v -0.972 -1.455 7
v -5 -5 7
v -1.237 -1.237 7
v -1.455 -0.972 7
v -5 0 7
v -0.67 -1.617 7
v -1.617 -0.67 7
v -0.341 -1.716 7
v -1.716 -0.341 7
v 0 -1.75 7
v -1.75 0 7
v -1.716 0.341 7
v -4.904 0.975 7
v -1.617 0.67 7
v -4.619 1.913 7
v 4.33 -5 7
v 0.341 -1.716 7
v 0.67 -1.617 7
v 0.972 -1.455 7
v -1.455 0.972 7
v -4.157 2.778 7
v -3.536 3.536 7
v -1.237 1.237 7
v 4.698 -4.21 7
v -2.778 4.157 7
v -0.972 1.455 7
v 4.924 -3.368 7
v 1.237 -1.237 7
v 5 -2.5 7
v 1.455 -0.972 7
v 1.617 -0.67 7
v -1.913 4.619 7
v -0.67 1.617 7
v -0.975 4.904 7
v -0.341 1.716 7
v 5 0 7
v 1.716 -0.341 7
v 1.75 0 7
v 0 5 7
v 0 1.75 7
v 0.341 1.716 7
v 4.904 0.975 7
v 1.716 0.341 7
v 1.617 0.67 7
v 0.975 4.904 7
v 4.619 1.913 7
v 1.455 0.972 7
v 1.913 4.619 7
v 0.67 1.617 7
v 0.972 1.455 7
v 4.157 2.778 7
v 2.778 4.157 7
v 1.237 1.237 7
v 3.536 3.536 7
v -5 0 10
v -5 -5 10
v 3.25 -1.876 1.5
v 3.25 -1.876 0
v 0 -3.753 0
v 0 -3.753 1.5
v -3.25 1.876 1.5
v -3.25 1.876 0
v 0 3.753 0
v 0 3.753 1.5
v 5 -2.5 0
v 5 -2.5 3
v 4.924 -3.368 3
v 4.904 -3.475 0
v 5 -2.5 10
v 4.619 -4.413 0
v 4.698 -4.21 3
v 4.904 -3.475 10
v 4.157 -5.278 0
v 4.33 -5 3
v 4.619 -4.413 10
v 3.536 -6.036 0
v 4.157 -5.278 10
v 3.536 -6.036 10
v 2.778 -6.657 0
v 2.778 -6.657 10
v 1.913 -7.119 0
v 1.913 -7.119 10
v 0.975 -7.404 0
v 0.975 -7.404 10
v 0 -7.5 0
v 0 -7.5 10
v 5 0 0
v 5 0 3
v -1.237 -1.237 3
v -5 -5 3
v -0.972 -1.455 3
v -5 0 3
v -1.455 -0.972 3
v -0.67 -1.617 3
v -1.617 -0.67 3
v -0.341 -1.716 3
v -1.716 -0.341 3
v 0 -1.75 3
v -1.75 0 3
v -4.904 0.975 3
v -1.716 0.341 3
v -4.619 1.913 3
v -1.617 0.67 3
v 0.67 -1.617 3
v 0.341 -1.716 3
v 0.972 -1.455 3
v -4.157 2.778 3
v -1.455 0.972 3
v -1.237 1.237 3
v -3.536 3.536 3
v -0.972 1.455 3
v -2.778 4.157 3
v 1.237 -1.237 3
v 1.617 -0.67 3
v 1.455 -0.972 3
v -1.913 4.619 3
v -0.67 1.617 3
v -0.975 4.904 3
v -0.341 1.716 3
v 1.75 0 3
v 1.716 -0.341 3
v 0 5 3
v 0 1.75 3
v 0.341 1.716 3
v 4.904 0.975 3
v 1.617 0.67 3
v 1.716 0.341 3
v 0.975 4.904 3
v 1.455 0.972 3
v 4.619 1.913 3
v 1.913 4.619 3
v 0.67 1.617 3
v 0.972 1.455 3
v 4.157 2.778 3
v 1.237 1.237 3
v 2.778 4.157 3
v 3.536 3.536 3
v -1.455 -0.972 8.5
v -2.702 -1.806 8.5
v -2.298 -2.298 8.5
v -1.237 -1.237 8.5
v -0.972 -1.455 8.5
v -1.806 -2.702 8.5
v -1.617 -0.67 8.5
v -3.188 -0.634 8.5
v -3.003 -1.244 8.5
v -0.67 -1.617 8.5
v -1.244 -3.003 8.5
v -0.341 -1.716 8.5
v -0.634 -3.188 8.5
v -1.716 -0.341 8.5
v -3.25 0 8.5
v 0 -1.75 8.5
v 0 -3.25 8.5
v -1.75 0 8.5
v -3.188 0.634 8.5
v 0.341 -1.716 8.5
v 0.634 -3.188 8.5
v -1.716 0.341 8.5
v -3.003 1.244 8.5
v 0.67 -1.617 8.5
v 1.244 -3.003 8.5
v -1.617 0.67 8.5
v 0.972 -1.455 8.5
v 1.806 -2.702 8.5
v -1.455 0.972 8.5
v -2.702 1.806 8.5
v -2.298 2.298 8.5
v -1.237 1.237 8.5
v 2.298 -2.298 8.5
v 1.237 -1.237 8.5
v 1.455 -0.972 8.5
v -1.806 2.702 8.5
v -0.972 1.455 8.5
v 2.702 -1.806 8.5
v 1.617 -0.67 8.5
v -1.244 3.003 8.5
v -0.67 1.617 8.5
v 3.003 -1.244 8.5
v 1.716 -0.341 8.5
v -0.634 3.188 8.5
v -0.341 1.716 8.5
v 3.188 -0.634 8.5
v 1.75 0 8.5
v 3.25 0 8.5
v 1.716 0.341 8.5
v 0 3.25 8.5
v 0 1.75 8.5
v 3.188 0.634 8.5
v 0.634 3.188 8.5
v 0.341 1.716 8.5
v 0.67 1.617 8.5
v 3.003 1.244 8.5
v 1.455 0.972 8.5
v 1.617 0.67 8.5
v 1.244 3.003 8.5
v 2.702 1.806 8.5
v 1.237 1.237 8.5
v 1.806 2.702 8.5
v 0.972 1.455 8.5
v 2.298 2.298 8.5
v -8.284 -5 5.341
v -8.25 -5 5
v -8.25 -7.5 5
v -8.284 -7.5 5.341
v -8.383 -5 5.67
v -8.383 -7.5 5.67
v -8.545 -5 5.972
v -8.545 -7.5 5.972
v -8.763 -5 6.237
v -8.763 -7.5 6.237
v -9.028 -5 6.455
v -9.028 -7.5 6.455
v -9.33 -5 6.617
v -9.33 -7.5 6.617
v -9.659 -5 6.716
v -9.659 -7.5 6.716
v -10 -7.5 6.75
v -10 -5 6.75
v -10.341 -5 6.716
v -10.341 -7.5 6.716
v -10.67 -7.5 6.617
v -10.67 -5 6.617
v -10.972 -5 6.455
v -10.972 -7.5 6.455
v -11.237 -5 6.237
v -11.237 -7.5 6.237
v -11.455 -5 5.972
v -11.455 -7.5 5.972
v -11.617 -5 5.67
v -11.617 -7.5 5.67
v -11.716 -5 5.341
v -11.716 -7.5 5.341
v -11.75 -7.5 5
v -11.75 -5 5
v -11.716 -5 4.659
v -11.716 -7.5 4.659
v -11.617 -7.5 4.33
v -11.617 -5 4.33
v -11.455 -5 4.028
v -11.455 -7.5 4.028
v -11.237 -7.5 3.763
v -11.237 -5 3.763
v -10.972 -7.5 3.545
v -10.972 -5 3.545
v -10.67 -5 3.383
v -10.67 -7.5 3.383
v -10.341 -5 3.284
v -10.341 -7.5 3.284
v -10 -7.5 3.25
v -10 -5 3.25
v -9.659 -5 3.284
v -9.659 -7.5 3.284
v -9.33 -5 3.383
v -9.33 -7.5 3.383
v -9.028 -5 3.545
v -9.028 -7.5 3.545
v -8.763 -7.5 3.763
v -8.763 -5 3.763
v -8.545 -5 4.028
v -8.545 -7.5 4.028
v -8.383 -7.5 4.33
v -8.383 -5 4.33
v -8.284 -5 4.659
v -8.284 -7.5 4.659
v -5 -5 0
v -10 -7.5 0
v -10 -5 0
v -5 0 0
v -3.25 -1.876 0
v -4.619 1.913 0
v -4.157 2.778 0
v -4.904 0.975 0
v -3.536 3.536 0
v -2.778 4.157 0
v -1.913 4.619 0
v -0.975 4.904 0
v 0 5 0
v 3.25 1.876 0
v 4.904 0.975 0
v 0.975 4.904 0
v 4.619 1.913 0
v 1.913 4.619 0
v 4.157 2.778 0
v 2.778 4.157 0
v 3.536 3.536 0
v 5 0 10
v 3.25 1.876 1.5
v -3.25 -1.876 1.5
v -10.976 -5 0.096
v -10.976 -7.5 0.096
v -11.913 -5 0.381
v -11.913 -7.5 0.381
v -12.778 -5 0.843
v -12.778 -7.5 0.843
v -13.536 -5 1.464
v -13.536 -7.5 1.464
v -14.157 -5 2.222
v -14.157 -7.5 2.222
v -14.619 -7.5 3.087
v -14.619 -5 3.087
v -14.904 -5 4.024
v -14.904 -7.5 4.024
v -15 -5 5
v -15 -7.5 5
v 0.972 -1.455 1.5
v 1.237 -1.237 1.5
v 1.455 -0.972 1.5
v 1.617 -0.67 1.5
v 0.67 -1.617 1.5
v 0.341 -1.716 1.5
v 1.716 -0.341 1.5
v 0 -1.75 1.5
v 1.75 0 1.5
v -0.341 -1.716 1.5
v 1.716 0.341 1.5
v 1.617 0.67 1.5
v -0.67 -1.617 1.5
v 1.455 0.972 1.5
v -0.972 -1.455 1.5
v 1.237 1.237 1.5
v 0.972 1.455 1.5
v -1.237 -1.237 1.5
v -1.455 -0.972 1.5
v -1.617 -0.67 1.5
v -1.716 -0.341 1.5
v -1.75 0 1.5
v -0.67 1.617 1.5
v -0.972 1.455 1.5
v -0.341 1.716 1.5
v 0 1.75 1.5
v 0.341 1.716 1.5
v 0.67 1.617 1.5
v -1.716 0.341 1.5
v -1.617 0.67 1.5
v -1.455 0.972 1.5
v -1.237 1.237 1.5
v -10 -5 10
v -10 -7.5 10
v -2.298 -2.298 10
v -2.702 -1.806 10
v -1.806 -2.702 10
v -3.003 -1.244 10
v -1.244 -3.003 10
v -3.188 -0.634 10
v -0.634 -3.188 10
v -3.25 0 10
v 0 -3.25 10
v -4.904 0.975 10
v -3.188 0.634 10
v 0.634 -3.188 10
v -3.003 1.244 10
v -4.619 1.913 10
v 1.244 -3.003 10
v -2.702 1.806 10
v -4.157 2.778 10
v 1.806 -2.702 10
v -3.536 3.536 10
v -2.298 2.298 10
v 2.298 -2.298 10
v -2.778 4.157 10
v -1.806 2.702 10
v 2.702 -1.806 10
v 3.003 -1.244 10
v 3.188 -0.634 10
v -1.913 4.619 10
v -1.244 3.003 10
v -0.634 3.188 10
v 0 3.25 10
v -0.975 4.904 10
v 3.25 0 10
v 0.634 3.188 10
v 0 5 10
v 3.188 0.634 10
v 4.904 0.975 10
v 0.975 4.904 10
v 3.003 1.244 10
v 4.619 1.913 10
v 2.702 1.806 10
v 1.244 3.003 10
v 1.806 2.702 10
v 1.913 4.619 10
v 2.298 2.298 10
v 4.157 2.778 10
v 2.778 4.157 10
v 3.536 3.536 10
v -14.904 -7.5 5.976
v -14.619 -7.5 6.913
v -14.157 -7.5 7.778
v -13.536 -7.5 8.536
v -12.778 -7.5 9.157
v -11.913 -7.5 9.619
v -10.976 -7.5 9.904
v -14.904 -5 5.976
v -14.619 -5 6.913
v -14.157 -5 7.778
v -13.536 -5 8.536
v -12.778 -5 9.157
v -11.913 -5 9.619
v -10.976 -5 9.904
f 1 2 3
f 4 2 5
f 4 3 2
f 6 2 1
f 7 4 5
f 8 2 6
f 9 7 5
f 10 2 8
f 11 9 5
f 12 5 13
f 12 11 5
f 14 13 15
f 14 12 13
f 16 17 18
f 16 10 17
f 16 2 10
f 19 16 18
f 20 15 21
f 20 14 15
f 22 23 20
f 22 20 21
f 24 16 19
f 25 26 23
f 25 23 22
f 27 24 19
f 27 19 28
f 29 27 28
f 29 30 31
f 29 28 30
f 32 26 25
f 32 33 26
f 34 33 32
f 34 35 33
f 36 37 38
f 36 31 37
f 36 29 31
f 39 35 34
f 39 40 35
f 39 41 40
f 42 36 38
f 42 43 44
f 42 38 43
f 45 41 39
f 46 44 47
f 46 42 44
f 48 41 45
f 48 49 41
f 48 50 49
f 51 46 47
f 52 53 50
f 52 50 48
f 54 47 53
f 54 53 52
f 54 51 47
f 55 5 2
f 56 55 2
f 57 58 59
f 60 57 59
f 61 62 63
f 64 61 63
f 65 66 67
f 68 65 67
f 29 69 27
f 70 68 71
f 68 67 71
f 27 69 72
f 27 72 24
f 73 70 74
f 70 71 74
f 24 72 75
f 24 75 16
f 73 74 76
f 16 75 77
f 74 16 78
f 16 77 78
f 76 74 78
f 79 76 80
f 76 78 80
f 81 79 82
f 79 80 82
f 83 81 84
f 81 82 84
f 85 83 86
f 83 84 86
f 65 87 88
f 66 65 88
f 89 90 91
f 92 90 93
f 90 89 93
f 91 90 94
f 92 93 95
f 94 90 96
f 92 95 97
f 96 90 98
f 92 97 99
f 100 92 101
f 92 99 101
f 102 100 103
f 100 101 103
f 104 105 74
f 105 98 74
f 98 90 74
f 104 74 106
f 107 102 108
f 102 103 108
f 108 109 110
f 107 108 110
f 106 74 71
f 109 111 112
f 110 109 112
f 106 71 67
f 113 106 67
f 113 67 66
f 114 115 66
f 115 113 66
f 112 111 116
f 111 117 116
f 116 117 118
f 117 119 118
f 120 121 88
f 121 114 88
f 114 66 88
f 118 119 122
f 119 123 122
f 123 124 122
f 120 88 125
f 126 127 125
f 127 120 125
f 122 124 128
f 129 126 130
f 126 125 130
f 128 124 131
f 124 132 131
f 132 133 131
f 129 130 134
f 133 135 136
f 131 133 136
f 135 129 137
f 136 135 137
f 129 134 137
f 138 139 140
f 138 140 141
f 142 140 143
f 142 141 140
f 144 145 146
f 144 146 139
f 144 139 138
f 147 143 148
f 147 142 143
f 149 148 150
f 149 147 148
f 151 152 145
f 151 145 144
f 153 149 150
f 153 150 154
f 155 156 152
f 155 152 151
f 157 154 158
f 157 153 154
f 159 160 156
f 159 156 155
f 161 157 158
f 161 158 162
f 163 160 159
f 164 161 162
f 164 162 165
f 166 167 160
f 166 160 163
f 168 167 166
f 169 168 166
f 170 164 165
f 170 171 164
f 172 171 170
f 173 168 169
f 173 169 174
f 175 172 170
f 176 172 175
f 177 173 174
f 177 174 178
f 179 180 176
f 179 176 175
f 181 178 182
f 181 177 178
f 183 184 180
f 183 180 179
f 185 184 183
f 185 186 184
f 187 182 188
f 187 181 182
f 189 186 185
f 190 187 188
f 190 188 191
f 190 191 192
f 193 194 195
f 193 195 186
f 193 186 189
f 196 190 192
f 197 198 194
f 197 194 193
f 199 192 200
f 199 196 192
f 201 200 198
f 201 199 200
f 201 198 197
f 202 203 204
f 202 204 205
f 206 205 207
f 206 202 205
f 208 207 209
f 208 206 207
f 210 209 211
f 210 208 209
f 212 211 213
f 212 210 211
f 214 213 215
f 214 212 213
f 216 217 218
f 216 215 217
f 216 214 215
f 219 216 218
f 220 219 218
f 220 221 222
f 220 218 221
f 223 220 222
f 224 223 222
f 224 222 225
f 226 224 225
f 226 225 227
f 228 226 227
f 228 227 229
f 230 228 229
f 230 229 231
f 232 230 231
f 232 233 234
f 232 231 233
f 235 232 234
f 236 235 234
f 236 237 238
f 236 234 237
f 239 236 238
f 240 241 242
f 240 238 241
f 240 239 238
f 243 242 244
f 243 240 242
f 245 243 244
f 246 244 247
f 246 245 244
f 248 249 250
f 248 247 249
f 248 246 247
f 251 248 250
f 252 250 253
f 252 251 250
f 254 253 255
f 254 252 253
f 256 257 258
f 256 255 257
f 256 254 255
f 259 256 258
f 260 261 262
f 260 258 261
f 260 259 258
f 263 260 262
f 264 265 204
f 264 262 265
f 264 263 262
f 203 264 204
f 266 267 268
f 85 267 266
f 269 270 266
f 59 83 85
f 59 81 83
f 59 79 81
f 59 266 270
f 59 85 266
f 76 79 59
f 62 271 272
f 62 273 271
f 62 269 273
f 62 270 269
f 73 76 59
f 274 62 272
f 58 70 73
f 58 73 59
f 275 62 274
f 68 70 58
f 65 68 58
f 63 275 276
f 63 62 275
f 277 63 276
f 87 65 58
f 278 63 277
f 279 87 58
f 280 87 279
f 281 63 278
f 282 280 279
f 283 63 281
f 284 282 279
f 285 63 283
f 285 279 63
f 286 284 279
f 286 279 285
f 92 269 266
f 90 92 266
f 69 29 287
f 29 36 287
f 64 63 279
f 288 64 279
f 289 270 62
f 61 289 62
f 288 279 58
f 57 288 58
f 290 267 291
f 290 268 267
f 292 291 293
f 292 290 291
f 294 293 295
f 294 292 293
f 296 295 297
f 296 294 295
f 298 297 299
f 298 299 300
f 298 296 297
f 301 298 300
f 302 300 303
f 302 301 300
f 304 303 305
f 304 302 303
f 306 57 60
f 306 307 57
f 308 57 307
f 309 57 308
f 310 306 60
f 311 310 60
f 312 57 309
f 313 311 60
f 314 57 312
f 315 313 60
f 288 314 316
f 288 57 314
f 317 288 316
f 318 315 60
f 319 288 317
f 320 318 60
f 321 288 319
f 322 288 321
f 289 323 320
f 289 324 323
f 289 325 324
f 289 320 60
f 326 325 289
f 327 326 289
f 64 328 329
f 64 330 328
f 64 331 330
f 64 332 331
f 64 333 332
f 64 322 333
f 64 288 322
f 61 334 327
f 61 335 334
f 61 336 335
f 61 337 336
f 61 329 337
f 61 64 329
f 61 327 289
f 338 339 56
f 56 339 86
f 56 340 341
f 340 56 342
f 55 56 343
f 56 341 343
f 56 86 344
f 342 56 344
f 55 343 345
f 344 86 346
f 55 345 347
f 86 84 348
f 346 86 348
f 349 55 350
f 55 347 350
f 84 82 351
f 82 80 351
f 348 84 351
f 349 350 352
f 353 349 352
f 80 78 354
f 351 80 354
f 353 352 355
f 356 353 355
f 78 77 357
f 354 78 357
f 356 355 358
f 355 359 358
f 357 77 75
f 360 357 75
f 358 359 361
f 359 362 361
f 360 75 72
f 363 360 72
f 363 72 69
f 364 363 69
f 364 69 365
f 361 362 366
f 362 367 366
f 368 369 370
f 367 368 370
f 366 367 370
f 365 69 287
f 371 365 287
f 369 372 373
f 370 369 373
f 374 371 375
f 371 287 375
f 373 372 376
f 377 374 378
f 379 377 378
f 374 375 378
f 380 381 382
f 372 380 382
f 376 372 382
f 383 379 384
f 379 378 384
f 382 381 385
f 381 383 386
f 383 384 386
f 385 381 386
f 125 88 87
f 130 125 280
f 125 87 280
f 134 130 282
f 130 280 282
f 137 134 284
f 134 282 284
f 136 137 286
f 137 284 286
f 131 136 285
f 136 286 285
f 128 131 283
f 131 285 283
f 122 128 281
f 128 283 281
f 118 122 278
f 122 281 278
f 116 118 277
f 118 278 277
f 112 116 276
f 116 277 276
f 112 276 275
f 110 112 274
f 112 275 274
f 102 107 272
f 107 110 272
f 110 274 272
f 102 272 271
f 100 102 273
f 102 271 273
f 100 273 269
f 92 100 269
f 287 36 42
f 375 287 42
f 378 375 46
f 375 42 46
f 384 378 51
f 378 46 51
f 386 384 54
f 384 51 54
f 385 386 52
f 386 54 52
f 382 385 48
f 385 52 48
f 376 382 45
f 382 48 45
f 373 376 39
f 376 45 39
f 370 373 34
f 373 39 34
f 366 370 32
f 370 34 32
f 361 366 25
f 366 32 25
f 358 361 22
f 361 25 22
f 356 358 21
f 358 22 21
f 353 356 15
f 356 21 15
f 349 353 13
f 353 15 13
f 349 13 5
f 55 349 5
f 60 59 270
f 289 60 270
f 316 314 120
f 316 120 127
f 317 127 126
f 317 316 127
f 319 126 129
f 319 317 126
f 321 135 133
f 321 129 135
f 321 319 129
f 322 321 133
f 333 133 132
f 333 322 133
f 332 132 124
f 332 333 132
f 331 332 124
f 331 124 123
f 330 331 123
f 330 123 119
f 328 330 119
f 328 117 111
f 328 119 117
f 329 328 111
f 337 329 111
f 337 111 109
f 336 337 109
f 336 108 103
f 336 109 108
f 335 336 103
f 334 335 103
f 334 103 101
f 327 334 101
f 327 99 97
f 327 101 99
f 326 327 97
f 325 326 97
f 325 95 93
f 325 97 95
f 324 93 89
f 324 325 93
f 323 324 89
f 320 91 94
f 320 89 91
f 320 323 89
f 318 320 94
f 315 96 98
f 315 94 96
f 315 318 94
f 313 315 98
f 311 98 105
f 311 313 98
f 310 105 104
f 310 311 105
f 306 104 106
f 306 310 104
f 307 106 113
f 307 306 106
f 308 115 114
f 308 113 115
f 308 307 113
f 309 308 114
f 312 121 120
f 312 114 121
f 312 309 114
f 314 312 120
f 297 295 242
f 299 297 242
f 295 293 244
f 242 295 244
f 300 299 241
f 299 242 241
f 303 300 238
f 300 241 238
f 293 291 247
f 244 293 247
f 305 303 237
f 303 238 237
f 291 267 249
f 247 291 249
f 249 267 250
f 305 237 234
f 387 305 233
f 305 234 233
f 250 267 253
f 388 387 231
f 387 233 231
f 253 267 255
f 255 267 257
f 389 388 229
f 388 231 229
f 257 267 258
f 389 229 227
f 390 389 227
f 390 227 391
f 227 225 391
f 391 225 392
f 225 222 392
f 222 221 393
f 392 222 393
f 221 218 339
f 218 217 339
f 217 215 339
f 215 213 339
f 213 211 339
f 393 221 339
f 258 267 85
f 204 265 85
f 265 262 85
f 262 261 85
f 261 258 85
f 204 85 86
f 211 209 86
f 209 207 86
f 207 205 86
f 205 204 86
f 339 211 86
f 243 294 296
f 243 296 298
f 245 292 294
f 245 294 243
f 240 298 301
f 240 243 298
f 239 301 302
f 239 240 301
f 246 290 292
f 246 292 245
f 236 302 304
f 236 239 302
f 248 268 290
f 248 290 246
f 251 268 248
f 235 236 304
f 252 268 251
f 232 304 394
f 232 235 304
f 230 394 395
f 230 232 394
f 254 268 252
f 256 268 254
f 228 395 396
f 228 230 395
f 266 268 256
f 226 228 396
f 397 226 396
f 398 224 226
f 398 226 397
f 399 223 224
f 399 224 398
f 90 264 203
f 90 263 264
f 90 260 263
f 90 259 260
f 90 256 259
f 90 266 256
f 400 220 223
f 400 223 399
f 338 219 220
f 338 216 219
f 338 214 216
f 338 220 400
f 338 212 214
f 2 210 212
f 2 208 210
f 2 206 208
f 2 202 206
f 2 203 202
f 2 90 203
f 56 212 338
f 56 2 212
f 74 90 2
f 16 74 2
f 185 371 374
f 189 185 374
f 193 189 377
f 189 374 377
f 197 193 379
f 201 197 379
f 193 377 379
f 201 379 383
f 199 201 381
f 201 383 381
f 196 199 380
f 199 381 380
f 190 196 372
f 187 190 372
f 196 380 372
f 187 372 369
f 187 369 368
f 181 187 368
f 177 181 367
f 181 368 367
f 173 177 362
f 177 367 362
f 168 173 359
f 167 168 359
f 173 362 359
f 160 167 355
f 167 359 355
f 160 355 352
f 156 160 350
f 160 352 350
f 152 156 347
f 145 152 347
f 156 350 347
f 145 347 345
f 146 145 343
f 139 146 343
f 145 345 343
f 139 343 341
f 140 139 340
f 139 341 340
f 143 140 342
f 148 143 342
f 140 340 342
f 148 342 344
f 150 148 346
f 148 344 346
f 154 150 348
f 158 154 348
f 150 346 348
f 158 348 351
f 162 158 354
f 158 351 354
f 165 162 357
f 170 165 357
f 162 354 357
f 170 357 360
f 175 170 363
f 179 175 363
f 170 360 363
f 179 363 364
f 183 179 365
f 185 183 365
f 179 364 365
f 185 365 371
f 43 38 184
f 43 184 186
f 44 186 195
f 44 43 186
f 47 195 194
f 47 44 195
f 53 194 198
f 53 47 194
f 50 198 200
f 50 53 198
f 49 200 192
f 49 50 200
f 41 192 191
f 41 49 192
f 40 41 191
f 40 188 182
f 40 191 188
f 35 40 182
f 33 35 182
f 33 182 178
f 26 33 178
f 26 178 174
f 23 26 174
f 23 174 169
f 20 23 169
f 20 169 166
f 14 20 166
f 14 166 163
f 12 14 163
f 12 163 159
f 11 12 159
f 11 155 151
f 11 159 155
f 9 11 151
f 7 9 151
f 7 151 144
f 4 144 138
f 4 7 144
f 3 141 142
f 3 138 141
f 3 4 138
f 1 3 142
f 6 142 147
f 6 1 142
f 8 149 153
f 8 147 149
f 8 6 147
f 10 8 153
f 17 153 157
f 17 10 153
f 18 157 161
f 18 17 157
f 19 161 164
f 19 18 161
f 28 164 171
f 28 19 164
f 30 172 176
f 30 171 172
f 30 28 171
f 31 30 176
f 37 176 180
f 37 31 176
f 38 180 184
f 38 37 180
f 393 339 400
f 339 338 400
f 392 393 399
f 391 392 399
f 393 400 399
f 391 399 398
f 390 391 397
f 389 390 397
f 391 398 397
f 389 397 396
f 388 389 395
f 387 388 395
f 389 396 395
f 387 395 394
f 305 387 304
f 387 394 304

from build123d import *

# Parameters (mm, degrees)
ESBO_O1_R                  = 5
ESBO_O1_R_2                = 1.75
RESSALTO_EXTRUS_O1_DEPTH   = 10
ESBO_O2_W                  = 10
ESBO_O2_H                  = 2.5
RESSALTO_EXTRUS_O2_DEPTH   = 20
CORTE_EXTRUS_O1_DEPTH      = 15
CORTE_EXTRUS_O1_DEPTH_BACK = 14
ESBO_O3_R                  = 1.75
CORTE_EXTRUS_O3_DEPTH      = 12
CORTE_EXTRUS_O3_DEPTH_BACK = 14
ESBO_O5_W                  = 4
ESBO_O5_H                  = 14.425539271
FILETE1_R                  = 5
FILETE2_R                  = 5
CORTE_EXTRUS_O4_DEPTH      = 1.5
ESBO_O7_R                  = 3.25
CORTE_EXTRUS_O5_DEPTH      = 1.5


# Some blends are built 0.0001 mm under size
with BuildPart() as part:
    # Esboço1 → Ressalto-extrusão1 (new body)
    # profile 1 of 3: a face of its own
    with BuildSketch(Plane.XY):
        with BuildLine():
            ThreePointArc((0, -5), (-3.535533906, -3.535533906), (-5, 0))
            Line((-5, 0), (-5, -5))
            Line((-5, -5), (0, -5))
        make_face()
    # profile 2 of 3: a face of its own
    with BuildSketch(Plane.XY):
        Circle(ESBO_O1_R)
        Circle(ESBO_O1_R_2, mode=Mode.SUBTRACT)
    # profile 3 of 3: a face of its own
    with BuildSketch(Plane.XY):
        with BuildLine():
            Line((5, -5), (5, 0))
            ThreePointArc((5, 0), (3.535533906, -3.535533906), (0, -5))
            Line((0, -5), (5, -5))
        make_face()
    extrude(amount=RESSALTO_EXTRUS_O1_DEPTH)

    # Esboço2 → Ressalto-extrusão2 (add)
    with BuildSketch(Plane(origin=(5, 0, 5), x_dir=(0, 0, 1), z_dir=(-1, 0, 0))):
        with Locations((0, -6.25)):
            Rectangle(ESBO_O2_W, ESBO_O2_H)
    extrude(amount=RESSALTO_EXTRUS_O2_DEPTH)

    # Esboço3 → Corte-extrusão1 (cut, two sides: drawn at the far end of the back side and taken through both)
    with BuildSketch(Plane.XZ.offset(5).offset(-CORTE_EXTRUS_O1_DEPTH_BACK)):
        with Locations((-10, 5)):
            Circle(ESBO_O3_R)
    extrude(amount=CORTE_EXTRUS_O1_DEPTH + CORTE_EXTRUS_O1_DEPTH_BACK, mode=Mode.SUBTRACT)

    # Esboço5 → Corte-extrusão3 (cut, two sides: drawn at the far end of the back side and taken through both)
    with BuildSketch(Plane.ZY.offset(5).offset(-CORTE_EXTRUS_O3_DEPTH_BACK)):
        with Locations((5, 2.212769635)):
            Rectangle(ESBO_O5_W, ESBO_O5_H)
    extrude(amount=CORTE_EXTRUS_O3_DEPTH + CORTE_EXTRUS_O3_DEPTH_BACK, mode=Mode.SUBTRACT)

    # Filete1
    filete1_edges = [part.edges().sort_by_distance(p)[0] for p in [
        (-15, -6.25, 10),
        (-15, -6.25, 0),
    ]]
    fillet(filete1_edges, radius=FILETE1_R - 0.0001)  # a hair under: the kernel refuses the full size

    # Filete2
    # the kernel refuses this fillet: 5 mm, written as the material it takes off along each edge
    with BuildSketch(Plane(origin=(5, -7.5, 22.5), x_dir=(-1, 0, 0), z_dir=(0, 0, -1))) as filete2_piece_1:
        with BuildLine():
            CenterArc((FILETE2_R, FILETE2_R), FILETE2_R, 180, 90)
            Line((0, FILETE2_R), (0, 0))
            Line((0, 0), (FILETE2_R, 0))
        make_face()
    extrude(amount=35, mode=Mode.SUBTRACT)

    # Esboço6 → Corte-extrusão4 (cut)
    with BuildSketch(Plane(origin=(0, 0, 0), x_dir=(-1, 0, 0), z_dir=(0, 0, -1))):
        Polygon((0, 3.75277675), (-3.25, 1.876388375), (-3.25, -1.876388375), (0, -3.75277675), (3.25, -1.876388375), (3.25, 1.876388375), align=None)
    extrude(amount=-CORTE_EXTRUS_O4_DEPTH, mode=Mode.SUBTRACT)

    # Esboço7 → Corte-extrusão5 (cut)
    with BuildSketch(Plane.XY.offset(10)):
        Circle(ESBO_O7_R)
    extrude(amount=-CORTE_EXTRUS_O5_DEPTH, mode=Mode.SUBTRACT)


solid = part.part
